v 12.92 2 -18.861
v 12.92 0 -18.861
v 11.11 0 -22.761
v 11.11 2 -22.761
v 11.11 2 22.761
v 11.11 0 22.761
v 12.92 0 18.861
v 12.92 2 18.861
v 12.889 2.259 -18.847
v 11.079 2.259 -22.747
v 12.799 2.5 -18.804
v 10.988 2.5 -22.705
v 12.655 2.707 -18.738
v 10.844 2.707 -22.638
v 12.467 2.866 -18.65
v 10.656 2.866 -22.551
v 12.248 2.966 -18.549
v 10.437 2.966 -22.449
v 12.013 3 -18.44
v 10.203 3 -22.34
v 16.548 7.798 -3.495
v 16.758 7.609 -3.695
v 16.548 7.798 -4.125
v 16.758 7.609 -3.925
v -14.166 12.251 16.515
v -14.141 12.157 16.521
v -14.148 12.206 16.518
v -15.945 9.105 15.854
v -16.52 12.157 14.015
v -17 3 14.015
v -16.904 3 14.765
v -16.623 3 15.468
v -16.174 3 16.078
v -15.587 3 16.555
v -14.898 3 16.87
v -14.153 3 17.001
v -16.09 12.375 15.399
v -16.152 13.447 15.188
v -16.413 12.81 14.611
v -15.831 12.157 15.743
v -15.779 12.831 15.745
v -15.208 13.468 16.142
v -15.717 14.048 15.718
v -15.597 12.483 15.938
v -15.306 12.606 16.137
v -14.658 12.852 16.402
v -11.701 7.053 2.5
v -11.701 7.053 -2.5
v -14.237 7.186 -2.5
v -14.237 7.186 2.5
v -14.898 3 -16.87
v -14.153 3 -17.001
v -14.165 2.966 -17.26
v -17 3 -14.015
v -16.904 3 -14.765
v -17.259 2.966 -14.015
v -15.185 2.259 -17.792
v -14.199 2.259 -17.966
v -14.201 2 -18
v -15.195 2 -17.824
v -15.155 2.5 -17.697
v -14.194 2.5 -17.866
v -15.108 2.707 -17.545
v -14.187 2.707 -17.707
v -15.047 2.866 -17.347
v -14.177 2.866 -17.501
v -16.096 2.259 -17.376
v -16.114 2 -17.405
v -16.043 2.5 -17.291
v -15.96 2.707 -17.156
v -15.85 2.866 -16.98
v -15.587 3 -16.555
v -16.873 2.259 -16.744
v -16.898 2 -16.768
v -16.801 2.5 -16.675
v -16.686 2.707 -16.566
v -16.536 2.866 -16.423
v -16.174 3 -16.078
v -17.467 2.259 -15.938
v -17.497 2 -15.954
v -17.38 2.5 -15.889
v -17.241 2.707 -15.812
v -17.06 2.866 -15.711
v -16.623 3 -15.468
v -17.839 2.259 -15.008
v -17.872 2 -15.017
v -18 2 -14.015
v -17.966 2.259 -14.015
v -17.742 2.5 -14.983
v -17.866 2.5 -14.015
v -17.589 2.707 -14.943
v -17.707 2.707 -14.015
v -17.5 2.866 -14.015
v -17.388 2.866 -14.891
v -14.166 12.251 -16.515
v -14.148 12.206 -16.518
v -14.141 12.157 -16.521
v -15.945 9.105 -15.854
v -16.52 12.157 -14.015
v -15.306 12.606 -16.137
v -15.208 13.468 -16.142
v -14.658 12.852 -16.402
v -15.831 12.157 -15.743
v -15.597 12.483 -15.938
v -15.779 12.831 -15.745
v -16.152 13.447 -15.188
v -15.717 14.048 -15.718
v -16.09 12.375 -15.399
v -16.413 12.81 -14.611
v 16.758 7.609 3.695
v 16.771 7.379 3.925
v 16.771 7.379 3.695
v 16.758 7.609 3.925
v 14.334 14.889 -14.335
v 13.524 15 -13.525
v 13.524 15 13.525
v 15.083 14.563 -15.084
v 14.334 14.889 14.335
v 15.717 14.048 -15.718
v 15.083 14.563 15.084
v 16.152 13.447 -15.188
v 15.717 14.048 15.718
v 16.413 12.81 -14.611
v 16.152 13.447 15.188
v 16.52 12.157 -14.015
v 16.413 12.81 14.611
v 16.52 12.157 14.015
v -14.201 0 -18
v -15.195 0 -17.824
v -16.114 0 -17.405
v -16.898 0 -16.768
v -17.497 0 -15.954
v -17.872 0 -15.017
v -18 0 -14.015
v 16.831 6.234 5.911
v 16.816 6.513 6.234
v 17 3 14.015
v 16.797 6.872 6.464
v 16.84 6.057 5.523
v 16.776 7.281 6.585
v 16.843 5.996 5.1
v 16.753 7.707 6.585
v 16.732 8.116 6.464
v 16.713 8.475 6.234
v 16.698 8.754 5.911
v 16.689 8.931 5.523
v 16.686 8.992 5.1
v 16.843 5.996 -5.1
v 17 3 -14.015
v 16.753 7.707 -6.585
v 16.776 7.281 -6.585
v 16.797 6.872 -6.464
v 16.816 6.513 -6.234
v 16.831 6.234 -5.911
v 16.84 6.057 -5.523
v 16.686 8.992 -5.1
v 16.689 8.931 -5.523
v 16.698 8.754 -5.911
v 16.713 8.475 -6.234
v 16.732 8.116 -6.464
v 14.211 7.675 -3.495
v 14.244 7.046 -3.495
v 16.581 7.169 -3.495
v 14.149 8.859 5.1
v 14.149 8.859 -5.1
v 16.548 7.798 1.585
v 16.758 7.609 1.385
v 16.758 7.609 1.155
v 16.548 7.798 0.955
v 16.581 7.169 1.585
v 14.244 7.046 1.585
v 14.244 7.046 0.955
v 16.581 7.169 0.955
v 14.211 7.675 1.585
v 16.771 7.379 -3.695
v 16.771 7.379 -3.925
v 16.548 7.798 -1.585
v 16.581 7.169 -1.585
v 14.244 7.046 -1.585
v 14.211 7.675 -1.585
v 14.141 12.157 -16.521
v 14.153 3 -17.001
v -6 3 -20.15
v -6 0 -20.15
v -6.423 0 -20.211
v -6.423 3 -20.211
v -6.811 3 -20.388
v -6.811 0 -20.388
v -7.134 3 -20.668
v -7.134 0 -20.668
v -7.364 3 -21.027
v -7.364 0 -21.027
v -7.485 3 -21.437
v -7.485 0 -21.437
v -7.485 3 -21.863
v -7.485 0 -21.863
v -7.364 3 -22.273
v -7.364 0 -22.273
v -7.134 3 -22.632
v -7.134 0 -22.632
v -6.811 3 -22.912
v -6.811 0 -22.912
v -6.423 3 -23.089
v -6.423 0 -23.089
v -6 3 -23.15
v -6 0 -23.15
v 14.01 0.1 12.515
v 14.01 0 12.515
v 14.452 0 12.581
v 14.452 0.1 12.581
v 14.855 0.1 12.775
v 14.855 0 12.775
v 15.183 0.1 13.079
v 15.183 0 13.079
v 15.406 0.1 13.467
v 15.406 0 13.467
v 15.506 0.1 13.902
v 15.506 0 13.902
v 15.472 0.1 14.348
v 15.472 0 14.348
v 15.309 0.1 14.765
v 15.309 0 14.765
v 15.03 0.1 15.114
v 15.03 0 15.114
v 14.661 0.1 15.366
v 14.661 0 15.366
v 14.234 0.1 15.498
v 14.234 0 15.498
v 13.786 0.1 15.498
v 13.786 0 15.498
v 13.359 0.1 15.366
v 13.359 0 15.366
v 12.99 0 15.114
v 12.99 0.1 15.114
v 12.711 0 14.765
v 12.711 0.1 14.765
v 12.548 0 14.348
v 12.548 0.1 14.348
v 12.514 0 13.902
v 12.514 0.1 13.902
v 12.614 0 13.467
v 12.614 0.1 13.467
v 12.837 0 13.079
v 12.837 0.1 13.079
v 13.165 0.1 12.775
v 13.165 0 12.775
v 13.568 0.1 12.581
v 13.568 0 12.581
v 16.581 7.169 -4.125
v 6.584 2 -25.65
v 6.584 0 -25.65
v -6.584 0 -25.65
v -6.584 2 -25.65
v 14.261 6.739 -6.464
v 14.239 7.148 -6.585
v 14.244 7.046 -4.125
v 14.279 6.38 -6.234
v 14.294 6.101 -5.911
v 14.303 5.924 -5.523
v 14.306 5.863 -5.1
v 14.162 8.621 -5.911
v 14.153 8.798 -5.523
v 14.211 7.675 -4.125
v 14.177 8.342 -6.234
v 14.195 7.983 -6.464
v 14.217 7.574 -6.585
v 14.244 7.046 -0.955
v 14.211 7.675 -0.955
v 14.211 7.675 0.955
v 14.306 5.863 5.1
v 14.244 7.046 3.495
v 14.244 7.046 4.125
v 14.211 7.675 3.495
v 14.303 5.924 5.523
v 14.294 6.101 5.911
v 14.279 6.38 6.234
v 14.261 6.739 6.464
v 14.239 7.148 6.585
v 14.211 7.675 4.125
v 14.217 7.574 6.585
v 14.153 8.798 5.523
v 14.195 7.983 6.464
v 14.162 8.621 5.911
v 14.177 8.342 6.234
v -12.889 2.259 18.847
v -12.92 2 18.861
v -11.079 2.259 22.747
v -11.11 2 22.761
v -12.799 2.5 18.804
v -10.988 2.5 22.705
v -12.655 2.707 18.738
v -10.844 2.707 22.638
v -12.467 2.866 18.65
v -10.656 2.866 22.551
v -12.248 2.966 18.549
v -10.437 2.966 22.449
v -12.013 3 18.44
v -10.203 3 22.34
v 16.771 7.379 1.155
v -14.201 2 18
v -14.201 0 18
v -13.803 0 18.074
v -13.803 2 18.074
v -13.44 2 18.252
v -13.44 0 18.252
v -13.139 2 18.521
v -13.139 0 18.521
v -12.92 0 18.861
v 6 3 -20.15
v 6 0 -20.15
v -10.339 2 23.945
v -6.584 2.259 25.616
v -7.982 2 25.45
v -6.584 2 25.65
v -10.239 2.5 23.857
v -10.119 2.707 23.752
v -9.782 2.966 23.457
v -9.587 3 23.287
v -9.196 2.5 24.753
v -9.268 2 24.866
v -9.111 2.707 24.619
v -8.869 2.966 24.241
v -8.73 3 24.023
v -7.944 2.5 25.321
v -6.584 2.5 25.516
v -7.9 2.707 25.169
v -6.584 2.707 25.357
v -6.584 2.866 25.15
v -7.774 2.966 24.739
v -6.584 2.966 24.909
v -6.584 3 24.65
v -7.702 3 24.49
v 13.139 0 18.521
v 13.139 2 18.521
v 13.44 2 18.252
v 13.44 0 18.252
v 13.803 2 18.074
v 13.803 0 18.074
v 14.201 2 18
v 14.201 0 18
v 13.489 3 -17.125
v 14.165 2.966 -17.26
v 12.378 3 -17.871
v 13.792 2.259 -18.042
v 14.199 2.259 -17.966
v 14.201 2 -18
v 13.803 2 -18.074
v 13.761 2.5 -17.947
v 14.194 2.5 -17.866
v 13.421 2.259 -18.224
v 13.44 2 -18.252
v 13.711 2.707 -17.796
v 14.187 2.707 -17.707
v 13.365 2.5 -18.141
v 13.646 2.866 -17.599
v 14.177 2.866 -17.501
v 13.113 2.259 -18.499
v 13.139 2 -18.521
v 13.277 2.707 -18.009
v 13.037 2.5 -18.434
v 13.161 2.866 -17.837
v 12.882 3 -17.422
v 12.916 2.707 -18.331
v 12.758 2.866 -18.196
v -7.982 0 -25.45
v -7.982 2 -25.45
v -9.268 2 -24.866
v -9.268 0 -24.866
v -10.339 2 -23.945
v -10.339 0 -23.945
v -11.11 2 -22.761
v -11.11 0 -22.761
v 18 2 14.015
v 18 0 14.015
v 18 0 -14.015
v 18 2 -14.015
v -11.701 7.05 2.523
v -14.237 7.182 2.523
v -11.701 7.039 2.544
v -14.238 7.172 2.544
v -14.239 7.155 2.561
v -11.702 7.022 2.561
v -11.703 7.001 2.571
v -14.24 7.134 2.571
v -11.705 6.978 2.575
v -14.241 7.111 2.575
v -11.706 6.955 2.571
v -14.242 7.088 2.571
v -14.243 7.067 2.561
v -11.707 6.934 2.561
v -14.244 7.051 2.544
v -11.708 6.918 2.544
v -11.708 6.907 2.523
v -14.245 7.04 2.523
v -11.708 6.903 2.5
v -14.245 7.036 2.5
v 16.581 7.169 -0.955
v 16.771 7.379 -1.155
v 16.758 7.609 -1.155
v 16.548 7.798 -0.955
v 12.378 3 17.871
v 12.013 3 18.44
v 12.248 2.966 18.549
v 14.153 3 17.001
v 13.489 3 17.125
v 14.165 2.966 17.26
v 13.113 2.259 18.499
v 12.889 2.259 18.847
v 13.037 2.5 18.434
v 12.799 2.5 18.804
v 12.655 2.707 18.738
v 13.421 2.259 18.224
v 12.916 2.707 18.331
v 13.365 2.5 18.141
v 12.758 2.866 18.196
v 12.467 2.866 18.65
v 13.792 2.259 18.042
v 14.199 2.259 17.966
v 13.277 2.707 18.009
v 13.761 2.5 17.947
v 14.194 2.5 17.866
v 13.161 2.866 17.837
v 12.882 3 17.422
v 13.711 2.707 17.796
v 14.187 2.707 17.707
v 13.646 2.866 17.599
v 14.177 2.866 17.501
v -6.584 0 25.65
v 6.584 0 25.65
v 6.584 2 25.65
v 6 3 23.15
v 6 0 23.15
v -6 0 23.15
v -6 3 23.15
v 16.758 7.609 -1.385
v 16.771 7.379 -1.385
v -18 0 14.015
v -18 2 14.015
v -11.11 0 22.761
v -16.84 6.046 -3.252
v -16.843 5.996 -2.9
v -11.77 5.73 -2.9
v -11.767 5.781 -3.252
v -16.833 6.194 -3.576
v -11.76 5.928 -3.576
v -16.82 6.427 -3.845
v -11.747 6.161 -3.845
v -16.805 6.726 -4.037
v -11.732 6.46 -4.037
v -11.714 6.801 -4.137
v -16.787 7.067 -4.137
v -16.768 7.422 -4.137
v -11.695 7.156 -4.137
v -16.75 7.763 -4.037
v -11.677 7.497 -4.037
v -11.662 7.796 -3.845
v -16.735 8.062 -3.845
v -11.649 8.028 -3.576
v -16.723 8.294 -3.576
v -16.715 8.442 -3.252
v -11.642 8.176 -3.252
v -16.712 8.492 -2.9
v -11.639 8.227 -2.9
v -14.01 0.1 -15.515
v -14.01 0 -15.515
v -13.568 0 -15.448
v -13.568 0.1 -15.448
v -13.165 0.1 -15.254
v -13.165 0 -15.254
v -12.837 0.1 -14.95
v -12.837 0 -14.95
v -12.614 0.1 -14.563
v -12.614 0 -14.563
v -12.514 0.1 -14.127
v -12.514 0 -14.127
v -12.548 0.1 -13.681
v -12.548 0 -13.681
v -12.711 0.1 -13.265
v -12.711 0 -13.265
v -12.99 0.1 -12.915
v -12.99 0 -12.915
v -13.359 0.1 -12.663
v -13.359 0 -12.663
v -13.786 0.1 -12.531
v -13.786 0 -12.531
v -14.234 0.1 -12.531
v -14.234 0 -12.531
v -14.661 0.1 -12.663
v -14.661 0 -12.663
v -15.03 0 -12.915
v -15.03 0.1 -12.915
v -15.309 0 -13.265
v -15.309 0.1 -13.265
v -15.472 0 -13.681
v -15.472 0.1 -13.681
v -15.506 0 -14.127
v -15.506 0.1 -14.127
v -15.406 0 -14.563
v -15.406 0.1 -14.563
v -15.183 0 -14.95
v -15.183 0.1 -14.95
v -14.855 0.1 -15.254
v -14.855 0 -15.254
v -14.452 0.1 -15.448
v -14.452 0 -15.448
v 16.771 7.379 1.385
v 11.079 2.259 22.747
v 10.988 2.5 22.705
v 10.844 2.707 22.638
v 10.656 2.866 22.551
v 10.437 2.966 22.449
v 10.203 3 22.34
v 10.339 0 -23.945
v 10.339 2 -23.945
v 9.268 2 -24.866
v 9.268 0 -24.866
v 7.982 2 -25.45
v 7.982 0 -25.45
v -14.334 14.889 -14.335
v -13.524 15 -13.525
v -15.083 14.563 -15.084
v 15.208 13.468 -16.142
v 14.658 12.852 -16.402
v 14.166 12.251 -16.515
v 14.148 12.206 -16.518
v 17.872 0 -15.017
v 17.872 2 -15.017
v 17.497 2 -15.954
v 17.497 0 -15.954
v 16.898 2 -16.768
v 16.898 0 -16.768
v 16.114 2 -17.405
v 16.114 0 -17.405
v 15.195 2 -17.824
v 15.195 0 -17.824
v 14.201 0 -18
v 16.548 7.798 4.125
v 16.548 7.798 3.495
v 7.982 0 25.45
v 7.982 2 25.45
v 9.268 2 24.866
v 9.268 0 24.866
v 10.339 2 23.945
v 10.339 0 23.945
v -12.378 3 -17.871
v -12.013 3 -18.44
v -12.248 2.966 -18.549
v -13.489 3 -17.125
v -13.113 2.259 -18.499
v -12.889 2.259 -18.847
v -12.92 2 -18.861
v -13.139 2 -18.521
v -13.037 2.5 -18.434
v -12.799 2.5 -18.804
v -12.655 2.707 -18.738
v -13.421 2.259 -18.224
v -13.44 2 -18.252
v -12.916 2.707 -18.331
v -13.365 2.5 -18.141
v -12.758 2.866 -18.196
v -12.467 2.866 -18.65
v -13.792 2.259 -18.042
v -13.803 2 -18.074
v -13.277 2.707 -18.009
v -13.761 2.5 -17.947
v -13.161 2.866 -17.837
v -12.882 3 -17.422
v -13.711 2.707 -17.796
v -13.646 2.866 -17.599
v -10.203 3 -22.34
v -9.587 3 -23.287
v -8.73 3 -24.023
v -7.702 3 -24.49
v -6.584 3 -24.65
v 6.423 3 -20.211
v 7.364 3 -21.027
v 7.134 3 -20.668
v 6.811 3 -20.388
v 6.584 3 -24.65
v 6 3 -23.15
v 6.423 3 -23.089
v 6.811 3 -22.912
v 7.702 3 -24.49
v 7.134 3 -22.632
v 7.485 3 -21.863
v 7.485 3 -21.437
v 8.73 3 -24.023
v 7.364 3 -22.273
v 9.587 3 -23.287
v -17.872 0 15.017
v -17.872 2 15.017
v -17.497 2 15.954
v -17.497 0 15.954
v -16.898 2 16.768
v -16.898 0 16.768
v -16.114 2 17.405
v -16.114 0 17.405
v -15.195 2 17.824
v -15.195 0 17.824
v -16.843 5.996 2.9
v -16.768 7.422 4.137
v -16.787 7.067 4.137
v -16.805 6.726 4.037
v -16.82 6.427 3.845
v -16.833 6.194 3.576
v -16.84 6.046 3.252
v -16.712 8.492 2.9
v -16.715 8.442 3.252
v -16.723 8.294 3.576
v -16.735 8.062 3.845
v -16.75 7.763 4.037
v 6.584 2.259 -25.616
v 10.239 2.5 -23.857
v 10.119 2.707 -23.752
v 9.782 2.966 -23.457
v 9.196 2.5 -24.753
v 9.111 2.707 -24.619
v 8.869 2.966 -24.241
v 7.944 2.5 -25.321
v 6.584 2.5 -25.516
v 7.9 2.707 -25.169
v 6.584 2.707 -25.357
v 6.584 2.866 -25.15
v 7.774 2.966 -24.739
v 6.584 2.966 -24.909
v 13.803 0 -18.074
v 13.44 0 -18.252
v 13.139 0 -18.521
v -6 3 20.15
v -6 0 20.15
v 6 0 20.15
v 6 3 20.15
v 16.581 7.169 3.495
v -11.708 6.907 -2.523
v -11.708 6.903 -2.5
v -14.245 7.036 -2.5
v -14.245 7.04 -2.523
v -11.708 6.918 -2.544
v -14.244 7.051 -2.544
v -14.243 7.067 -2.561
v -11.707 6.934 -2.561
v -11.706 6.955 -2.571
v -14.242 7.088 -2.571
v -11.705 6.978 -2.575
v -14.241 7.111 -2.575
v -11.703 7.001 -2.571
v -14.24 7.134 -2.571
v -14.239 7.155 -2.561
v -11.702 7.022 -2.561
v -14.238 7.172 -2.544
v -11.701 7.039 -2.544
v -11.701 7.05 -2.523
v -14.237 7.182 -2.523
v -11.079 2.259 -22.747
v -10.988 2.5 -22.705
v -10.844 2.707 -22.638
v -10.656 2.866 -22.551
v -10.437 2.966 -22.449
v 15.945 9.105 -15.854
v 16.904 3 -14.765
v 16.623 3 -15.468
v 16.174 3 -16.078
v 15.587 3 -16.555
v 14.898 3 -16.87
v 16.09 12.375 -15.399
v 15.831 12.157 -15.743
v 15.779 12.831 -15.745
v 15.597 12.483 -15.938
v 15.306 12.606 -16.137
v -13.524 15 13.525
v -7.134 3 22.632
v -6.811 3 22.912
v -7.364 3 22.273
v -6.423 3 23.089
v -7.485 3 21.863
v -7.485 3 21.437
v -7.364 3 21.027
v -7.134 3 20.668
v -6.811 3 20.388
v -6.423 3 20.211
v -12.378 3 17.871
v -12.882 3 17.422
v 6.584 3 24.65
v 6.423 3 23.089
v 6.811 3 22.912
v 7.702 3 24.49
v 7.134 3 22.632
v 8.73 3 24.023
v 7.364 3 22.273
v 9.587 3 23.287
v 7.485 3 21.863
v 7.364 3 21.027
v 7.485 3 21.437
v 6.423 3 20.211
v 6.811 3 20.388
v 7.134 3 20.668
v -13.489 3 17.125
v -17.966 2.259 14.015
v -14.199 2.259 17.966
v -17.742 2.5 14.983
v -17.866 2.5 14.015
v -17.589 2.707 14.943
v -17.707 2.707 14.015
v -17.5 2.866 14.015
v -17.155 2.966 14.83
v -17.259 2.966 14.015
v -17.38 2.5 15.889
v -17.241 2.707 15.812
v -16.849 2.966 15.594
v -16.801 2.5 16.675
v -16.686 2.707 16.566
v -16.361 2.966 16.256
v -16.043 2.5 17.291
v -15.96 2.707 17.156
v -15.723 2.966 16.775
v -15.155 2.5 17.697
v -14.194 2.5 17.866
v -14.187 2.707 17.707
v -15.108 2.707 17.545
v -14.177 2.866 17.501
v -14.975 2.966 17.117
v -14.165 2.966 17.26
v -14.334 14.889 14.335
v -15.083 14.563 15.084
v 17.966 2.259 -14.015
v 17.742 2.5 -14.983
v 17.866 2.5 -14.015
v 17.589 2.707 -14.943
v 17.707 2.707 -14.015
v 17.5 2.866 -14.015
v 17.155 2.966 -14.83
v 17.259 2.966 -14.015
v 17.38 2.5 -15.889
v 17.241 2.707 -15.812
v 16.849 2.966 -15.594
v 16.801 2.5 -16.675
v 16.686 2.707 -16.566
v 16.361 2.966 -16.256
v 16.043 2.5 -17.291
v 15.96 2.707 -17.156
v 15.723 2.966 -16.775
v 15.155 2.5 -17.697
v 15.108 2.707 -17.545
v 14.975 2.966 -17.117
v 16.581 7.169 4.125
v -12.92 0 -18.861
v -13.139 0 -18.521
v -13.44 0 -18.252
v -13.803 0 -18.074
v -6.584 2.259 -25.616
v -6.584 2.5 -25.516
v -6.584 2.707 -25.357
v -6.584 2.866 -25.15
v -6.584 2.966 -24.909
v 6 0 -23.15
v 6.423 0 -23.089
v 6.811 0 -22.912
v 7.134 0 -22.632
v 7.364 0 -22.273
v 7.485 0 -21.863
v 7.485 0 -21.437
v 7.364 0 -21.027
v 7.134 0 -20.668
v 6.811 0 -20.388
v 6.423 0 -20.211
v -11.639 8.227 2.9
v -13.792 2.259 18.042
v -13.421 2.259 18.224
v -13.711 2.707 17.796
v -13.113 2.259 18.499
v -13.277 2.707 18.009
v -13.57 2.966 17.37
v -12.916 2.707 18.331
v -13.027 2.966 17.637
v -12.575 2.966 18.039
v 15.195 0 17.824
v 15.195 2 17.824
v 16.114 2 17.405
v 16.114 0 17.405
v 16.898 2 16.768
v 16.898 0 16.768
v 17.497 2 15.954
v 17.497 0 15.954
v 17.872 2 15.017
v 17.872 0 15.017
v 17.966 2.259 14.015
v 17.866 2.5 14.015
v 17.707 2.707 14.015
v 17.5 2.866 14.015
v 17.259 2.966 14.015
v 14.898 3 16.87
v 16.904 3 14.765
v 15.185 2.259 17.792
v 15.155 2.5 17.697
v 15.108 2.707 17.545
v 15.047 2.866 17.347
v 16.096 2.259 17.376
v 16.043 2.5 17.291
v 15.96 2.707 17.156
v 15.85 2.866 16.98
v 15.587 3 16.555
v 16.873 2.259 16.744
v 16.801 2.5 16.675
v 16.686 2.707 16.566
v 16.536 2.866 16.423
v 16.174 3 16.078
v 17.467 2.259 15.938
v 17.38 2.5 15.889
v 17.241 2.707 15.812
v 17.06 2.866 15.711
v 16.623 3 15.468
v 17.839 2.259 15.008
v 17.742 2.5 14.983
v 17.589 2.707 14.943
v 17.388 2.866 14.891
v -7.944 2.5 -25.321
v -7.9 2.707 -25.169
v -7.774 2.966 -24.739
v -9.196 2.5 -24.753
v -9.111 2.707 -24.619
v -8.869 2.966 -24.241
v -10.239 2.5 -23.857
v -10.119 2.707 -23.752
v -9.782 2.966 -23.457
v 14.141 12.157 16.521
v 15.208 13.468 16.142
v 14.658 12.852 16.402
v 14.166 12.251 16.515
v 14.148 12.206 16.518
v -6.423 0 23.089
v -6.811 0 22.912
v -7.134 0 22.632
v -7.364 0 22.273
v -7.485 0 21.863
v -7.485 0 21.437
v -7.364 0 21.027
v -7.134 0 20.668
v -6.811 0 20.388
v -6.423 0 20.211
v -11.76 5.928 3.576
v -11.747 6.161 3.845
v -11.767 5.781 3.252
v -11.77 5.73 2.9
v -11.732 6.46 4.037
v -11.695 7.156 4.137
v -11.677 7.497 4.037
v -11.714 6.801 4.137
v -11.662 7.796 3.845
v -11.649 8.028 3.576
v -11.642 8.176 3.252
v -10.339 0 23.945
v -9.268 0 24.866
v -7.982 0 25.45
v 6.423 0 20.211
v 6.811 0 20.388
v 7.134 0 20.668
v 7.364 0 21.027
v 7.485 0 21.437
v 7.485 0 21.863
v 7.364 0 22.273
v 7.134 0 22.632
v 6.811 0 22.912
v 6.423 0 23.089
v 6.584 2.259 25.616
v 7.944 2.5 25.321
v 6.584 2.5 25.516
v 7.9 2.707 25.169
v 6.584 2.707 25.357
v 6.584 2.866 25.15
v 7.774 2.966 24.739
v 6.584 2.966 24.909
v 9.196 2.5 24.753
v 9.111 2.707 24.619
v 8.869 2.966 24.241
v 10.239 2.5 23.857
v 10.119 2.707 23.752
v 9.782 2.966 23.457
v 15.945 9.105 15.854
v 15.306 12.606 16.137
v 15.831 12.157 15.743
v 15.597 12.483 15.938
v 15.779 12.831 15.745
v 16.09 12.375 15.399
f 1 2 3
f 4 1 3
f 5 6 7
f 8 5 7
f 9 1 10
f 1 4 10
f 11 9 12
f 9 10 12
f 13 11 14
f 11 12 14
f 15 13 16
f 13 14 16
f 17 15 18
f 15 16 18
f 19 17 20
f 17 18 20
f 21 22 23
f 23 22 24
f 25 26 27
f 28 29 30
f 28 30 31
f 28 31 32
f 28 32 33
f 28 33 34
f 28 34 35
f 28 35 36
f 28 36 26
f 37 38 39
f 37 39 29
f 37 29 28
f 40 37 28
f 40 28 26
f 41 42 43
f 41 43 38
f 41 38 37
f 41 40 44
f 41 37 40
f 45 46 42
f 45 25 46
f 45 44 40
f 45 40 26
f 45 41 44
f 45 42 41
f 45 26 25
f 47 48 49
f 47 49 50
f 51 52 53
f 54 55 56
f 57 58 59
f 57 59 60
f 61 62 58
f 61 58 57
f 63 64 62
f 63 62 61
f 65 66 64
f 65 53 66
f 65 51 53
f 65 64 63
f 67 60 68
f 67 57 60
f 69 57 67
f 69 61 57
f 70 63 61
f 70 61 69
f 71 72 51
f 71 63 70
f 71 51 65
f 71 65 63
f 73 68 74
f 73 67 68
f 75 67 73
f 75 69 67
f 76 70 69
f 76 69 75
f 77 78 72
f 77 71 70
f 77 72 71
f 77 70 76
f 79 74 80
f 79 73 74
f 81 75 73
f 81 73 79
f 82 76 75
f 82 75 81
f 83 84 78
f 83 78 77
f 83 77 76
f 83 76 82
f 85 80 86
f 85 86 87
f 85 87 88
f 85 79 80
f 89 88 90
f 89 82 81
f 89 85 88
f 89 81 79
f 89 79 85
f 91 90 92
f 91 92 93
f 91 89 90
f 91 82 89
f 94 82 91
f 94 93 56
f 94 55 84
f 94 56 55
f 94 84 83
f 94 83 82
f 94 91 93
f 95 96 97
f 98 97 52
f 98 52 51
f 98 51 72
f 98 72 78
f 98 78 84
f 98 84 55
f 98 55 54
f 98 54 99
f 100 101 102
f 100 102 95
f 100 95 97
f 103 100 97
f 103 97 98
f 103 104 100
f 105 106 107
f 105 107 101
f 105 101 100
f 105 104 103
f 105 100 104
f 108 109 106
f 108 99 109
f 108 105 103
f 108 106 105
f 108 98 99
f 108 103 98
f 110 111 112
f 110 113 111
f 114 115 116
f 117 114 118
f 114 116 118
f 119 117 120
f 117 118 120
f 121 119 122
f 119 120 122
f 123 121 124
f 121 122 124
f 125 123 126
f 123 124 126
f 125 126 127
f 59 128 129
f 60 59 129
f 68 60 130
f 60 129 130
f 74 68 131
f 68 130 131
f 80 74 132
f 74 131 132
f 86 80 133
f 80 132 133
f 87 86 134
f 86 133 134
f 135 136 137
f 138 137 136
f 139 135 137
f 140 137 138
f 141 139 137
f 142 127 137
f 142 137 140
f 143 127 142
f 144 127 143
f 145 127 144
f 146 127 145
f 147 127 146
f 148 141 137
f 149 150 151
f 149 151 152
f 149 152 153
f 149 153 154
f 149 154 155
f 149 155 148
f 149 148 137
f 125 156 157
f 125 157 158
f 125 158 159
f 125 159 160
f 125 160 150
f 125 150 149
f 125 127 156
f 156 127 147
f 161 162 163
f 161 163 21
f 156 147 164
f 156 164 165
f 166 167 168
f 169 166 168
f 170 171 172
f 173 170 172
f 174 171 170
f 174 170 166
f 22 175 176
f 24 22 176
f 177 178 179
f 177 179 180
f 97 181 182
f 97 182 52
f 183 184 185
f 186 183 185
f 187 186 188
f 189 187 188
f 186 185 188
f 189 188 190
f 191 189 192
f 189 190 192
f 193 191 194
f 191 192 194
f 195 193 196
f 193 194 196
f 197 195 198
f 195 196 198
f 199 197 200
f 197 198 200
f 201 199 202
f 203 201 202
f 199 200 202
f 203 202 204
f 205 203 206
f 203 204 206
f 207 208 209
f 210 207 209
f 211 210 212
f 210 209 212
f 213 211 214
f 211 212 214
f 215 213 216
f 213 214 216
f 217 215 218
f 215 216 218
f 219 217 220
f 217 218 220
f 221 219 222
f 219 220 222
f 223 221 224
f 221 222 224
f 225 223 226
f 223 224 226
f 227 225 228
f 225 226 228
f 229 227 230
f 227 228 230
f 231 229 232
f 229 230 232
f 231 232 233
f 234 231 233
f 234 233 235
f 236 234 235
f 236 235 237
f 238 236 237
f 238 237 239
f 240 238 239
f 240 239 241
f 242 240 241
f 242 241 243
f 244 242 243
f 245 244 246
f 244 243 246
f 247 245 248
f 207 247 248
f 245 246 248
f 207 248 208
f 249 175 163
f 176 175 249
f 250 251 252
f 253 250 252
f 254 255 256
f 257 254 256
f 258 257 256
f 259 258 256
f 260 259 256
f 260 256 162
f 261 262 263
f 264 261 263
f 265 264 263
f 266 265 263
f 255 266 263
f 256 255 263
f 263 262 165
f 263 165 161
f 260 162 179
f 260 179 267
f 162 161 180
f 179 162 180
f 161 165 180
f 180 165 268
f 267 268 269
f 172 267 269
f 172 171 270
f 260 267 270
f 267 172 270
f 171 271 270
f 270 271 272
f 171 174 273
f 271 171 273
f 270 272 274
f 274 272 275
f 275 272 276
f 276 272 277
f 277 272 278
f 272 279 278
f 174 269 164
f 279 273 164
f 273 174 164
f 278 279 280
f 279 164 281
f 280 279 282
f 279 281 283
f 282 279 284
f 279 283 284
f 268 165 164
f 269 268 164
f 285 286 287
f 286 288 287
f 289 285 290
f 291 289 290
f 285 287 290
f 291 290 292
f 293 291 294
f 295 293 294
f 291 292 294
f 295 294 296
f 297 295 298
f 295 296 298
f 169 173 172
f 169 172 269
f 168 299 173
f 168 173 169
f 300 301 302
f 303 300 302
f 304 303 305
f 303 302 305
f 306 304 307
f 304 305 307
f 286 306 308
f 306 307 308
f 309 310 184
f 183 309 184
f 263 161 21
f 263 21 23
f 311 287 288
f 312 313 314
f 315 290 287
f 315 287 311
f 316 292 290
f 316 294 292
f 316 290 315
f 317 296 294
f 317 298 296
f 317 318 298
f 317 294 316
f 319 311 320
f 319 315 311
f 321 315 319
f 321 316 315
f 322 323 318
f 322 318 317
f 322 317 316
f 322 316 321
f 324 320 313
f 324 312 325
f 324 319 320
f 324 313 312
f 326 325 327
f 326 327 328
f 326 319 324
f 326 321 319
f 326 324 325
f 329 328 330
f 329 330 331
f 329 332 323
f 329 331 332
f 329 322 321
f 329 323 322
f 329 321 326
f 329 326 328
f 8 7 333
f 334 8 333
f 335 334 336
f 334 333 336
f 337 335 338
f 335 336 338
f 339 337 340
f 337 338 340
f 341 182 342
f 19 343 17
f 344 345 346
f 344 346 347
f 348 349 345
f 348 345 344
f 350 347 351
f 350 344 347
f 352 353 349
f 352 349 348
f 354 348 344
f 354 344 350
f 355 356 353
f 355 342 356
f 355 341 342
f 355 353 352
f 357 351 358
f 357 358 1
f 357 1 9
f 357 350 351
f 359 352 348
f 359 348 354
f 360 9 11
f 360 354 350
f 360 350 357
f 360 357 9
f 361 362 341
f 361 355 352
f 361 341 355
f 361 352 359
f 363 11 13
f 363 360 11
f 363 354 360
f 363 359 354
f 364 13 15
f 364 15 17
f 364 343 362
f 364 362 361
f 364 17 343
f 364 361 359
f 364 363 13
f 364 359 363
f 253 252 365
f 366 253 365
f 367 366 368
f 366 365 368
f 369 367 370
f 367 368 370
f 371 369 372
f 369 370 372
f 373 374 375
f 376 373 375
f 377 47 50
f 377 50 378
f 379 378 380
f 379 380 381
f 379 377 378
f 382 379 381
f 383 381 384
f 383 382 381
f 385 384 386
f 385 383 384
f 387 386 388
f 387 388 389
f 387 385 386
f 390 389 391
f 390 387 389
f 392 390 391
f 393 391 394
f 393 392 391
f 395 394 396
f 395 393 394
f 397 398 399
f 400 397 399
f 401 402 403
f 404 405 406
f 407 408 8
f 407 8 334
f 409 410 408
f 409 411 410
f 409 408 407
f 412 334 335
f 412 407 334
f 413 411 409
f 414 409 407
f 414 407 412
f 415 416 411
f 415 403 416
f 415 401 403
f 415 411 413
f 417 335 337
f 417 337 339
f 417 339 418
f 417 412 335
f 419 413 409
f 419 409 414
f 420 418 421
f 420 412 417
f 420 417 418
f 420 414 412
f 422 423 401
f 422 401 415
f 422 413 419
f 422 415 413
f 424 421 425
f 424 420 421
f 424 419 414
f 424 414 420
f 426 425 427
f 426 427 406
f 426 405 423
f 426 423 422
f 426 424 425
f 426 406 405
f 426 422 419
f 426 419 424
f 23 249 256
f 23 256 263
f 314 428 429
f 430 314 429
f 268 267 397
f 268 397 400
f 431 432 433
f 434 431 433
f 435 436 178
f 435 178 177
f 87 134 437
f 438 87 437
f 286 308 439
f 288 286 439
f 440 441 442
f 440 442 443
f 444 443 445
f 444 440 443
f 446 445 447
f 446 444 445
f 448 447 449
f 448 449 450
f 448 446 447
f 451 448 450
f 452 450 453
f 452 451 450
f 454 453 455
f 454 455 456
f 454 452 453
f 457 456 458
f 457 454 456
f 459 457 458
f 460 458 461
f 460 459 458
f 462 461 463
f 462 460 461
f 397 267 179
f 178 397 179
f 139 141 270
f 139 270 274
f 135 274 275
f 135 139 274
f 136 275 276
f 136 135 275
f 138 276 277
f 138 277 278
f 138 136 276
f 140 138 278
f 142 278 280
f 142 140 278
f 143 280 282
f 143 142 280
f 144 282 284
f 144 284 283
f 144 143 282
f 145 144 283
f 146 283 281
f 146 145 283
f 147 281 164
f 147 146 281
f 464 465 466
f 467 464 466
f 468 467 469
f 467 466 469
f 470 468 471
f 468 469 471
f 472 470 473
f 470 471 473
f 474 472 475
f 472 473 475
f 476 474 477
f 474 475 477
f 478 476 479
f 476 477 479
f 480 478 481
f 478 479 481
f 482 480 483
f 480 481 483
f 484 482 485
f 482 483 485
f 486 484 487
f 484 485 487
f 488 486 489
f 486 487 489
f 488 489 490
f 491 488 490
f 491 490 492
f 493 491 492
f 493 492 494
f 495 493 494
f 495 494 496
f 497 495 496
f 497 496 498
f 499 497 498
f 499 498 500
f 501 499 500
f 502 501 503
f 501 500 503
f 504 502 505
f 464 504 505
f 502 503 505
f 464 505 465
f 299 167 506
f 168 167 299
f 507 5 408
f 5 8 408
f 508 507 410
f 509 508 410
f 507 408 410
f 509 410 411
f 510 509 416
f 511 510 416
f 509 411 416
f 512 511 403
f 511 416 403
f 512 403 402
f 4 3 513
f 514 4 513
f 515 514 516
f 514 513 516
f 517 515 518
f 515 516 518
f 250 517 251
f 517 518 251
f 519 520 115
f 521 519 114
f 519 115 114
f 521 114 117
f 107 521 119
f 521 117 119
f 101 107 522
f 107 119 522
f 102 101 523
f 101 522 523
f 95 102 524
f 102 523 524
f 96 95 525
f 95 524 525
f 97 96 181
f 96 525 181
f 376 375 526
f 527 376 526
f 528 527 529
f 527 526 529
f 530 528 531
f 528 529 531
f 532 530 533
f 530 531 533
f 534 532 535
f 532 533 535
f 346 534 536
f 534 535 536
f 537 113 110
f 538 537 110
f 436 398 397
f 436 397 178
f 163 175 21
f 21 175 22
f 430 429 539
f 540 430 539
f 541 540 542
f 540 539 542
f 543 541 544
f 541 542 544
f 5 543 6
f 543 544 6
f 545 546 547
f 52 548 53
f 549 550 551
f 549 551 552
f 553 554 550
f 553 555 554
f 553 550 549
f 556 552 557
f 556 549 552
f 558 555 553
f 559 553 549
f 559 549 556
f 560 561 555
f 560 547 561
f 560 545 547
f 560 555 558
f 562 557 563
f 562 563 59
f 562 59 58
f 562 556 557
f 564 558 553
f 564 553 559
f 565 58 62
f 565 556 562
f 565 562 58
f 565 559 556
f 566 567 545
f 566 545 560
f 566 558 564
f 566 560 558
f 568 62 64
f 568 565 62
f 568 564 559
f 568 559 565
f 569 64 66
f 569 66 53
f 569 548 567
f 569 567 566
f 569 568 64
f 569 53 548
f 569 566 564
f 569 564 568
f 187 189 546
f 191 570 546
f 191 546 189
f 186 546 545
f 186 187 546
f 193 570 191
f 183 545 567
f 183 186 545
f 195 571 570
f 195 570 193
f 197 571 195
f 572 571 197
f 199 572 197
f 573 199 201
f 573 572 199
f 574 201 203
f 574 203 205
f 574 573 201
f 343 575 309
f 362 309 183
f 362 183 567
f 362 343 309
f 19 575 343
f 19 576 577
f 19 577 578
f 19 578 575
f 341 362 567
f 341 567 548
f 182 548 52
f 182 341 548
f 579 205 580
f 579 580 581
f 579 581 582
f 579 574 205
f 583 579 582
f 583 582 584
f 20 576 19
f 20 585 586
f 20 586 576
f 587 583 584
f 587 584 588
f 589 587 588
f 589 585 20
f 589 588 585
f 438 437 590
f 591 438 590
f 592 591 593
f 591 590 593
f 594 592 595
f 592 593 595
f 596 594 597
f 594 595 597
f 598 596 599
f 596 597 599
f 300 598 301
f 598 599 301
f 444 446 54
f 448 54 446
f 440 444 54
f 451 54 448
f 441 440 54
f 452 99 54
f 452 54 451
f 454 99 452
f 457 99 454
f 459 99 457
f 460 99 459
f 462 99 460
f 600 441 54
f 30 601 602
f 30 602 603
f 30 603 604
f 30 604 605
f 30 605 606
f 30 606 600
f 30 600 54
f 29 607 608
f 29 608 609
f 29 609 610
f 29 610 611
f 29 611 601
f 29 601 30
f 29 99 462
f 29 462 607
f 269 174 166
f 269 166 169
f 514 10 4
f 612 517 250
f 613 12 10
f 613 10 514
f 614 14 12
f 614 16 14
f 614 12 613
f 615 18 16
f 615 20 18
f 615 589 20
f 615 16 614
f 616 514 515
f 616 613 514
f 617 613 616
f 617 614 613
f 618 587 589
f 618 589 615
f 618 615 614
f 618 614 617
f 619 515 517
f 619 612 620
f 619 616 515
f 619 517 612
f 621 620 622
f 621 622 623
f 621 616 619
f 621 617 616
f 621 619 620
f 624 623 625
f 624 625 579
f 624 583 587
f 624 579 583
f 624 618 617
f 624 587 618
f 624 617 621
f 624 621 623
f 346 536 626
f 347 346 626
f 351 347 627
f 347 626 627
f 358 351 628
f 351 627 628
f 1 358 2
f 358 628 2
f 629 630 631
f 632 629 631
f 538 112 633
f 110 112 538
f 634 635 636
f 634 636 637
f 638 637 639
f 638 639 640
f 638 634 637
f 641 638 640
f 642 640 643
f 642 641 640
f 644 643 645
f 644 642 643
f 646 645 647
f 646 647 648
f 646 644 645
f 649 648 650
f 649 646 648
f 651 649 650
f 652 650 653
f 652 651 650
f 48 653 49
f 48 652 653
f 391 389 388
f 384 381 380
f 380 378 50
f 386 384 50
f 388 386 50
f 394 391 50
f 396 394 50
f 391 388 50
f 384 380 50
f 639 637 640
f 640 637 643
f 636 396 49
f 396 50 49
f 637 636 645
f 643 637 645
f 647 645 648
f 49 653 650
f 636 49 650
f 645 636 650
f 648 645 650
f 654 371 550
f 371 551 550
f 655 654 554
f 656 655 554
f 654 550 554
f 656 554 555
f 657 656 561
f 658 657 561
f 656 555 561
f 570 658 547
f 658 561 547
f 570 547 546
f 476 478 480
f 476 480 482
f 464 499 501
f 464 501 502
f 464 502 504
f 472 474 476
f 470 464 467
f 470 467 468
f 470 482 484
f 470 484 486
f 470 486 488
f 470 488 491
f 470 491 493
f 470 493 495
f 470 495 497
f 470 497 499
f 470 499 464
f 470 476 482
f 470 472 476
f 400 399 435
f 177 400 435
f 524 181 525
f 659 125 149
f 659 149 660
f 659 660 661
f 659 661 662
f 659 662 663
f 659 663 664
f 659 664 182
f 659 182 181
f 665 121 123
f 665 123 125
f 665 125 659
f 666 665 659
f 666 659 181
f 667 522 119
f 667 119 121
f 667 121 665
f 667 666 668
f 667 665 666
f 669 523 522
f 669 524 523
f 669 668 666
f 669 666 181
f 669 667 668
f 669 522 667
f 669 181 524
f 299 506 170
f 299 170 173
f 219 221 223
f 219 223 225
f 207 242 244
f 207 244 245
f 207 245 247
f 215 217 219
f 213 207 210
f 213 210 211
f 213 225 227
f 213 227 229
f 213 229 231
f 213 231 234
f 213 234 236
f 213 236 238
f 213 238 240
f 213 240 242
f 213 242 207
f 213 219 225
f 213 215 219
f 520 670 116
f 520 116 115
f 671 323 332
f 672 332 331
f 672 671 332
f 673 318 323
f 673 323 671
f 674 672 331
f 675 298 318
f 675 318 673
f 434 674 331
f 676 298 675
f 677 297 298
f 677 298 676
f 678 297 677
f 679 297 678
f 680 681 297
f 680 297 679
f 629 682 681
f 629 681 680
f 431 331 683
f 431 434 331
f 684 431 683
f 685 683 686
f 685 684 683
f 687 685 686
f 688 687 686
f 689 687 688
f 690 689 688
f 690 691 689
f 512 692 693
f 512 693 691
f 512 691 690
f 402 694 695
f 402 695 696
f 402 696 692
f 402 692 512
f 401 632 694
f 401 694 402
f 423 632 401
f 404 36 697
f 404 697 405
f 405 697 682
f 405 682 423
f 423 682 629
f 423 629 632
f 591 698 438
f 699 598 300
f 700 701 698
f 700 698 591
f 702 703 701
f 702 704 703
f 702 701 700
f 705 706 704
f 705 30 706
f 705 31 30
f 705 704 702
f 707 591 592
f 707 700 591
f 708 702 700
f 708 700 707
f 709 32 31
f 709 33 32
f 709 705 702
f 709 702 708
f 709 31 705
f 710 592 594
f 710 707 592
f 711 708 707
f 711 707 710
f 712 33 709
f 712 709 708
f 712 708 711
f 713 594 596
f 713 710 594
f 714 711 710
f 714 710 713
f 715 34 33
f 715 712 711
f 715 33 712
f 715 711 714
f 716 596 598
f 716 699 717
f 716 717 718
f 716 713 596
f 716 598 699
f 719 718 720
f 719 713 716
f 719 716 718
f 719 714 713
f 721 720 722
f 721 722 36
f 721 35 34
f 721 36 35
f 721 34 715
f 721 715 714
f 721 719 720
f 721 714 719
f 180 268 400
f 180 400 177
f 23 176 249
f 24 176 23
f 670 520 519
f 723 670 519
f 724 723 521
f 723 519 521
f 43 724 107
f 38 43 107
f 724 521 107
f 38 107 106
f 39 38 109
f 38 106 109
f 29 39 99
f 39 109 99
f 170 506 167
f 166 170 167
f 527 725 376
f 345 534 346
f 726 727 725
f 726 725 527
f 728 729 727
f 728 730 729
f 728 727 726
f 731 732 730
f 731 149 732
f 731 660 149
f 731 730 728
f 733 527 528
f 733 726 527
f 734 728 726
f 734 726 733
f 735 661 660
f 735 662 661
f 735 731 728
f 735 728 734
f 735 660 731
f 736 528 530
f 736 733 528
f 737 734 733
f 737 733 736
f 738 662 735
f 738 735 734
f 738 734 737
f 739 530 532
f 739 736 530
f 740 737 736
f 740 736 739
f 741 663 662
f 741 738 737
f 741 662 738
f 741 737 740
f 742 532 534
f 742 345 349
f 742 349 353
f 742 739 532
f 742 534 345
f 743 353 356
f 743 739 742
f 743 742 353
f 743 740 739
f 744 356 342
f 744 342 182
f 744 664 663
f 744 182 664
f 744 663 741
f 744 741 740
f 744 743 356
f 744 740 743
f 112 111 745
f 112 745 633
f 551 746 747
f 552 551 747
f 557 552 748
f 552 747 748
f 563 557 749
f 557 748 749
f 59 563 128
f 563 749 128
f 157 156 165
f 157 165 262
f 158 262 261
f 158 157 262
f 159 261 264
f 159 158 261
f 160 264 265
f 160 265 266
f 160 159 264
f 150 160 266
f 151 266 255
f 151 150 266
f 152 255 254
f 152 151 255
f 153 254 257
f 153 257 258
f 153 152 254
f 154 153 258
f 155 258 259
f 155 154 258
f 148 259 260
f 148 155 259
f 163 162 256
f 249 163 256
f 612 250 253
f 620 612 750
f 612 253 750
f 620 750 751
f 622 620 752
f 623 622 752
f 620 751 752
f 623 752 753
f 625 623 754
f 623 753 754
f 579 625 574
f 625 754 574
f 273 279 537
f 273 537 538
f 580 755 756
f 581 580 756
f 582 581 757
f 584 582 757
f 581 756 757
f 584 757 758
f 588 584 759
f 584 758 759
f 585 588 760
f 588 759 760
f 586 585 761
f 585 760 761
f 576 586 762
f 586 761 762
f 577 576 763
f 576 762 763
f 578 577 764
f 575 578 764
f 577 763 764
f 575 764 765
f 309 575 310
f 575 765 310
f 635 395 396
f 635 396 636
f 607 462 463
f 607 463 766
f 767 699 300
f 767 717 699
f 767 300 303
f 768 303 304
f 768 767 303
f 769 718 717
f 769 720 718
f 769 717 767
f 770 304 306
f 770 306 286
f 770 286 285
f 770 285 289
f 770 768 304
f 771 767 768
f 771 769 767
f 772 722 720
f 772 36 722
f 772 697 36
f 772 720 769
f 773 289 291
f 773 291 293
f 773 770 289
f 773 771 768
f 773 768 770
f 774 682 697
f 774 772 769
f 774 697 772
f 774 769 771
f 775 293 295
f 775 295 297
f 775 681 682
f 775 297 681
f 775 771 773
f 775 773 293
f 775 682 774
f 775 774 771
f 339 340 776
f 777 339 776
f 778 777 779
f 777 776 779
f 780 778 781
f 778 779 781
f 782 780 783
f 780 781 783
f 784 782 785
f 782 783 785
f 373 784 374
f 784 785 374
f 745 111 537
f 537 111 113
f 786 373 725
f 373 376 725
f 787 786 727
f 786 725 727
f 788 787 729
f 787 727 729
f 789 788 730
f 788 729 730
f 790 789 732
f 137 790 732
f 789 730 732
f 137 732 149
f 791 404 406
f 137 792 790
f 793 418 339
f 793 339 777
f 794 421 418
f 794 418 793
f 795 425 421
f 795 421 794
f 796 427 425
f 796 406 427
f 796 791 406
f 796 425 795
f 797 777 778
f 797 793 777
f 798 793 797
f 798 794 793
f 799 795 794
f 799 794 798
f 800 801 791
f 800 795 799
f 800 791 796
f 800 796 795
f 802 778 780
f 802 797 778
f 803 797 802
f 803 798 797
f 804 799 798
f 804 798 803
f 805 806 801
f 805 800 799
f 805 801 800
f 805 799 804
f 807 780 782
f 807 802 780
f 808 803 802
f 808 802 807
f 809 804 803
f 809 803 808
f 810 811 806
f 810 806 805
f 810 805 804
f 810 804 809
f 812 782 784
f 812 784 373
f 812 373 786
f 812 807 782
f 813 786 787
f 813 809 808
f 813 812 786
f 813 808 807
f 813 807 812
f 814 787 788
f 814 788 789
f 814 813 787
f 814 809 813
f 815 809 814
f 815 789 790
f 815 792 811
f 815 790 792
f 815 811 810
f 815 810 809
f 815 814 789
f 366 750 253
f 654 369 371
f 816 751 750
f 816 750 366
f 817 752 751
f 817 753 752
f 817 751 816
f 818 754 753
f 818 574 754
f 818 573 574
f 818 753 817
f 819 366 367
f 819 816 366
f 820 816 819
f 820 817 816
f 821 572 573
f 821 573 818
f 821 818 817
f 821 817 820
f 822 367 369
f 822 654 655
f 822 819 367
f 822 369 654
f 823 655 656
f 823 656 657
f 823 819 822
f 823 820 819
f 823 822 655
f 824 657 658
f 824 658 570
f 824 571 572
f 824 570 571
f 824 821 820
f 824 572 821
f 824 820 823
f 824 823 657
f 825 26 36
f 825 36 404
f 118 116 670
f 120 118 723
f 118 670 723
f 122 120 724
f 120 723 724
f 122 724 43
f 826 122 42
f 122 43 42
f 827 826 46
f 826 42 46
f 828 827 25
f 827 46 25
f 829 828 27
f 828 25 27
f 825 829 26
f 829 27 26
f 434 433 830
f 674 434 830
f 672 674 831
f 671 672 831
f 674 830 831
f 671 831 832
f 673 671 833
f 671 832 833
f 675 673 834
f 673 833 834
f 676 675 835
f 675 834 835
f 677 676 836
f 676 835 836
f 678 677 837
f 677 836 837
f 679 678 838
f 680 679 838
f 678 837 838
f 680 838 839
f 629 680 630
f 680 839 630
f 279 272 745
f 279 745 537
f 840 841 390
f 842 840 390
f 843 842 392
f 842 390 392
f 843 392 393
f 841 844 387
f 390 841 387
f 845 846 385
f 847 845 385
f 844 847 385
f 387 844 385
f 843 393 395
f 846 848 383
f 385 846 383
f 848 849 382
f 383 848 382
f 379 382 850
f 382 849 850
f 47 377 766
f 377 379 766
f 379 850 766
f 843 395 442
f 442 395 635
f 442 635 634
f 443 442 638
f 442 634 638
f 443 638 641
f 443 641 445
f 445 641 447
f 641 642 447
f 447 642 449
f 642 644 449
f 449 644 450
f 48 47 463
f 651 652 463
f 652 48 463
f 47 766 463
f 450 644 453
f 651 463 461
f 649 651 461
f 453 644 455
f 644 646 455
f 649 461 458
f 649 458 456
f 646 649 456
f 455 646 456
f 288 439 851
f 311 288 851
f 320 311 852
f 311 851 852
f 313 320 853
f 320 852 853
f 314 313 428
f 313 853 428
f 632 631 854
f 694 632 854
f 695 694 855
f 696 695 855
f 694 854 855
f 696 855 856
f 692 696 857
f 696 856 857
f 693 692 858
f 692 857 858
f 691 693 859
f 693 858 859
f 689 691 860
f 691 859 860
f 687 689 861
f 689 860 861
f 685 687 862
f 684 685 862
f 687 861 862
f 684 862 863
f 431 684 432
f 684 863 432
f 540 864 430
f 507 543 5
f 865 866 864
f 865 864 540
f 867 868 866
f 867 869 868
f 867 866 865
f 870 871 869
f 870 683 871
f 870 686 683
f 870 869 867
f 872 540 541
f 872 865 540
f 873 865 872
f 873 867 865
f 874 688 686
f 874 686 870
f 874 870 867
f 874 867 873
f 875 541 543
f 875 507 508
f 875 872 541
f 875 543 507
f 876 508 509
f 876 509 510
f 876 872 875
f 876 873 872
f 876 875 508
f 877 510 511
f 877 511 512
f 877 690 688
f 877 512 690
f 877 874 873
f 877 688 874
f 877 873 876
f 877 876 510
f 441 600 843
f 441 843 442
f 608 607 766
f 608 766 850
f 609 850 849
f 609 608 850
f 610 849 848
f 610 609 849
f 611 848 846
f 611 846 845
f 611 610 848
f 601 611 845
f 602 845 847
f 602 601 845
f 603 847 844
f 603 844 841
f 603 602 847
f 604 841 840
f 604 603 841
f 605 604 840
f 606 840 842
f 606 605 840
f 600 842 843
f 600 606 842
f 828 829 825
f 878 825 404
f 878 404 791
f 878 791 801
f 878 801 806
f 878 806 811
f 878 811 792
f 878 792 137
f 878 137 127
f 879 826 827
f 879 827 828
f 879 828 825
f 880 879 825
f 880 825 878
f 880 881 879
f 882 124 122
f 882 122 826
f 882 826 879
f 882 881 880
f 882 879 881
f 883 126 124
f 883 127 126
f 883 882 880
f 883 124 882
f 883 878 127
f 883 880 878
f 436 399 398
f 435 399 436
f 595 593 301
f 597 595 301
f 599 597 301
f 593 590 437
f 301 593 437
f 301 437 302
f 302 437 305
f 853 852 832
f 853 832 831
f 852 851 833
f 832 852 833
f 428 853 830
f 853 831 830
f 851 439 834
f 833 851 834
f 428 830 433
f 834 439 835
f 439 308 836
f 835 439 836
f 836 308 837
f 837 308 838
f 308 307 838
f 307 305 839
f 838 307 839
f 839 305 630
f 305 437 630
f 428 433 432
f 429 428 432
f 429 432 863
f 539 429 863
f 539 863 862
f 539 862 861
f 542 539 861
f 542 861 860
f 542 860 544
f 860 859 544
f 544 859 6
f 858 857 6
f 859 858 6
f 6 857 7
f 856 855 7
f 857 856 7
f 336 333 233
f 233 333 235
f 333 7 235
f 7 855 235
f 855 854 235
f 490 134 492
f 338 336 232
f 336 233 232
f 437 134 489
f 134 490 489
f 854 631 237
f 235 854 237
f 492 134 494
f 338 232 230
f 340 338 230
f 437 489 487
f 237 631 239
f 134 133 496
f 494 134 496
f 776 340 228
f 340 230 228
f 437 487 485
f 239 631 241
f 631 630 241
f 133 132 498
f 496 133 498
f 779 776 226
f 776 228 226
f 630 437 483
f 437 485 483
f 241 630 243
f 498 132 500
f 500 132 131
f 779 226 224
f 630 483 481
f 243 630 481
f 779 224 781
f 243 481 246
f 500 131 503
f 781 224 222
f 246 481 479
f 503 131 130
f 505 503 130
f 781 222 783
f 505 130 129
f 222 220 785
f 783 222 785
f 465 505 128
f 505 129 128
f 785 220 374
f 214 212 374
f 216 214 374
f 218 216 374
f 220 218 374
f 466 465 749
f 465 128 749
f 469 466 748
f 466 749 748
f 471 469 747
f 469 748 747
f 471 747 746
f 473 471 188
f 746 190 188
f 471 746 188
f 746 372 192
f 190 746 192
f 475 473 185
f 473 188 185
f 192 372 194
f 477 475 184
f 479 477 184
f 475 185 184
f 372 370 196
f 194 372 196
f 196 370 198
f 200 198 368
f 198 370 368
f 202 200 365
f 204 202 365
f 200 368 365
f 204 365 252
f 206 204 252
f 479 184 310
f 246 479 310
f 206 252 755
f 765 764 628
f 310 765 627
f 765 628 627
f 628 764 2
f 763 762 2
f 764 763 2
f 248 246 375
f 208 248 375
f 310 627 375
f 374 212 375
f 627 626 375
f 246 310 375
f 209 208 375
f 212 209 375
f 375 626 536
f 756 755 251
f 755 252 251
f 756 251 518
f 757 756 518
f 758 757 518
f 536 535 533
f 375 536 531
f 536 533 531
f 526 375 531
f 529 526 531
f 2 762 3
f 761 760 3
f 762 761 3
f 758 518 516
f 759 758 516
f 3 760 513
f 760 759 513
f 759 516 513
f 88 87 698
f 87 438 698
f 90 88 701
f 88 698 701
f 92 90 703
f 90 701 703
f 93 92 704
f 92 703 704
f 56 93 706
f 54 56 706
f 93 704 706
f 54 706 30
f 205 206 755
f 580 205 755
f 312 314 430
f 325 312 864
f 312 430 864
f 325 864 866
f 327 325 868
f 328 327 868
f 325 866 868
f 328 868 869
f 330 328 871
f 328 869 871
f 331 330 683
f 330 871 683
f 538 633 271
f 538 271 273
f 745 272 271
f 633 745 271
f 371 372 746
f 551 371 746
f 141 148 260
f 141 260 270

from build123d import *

# Parameters (mm, degrees)
EXTRUDE_1_DEPTH     = 3
FILLET_1_R          = 1
EXTRUDE_2_DEPTH     = 12
EXTRUDE_2_TAPER     = 3
FILLET_3_R          = 3
FILLET_4_R          = 3
CUT_EXTRUDE_1_DEPTH = 2.54
SKETCH_5_W          = 0.63
SKETCH_5_H          = 0.63
EXTRUDE_3_DEPTH     = 2.54
CHAMFER_2_SIZE      = 0.2
CHAMFER_3_SIZE      = 0.2
CUT_EXTRUDE_2_DEPTH = 5.08
EXTRUDE_4_DEPTH     = 2.54
SKETCH_8_R          = 1.5
CUT_EXTRUDE_3_DEPTH = 0.1


with BuildPart() as part:
    # 草图1 → 凸台-拉伸1 (new body)
    with BuildSketch(Plane(origin=(0, 0, 0), x_dir=(1, 0, 0), z_dir=(0, 1, 0))):
        with BuildLine():
            ThreePointArc((11.109578501, 22.761132302), (9.268225449, 24.866230509), (6.58350481, 25.65))
            Line((6.58350481, 25.65), (-6.58350481, 25.65))
            ThreePointArc((-6.58350481, 25.65), (-9.268225449, 24.866230509), (-11.109578501, 22.761132302))
            Line((-11.109578501, 22.761132302), (-12.92017347, 18.860908481))
            ThreePointArc((-12.92017347, 18.860908481), (-13.440232827, 18.25183334), (-14.200505299, 18))
            ThreePointArc((-14.200505299, 18), (-16.897924527, 16.767729012), (-18, 14.014550498))
            Line((-18, 14.014550498), (-18, 13.985449502))
            Line((-18, 13.985449502), (-18, -13.985449502))
            Line((-18, -13.985449502), (-18, -14.014550498))
            ThreePointArc((-18, -14.014550498), (-16.897924527, -16.767729012), (-14.200505299, -18))
            ThreePointArc((-14.200505299, -18), (-13.440232827, -18.25183334), (-12.92017347, -18.860908481))
            Line((-12.92017347, -18.860908481), (-11.109578501, -22.761132302))
            ThreePointArc((-11.109578501, -22.761132302), (-9.268225449, -24.866230509), (-6.58350481, -25.65))
            Line((-6.58350481, -25.65), (6.58350481, -25.65))
            ThreePointArc((6.58350481, -25.65), (9.268225449, -24.866230509), (11.109578501, -22.761132302))
            Line((11.109578501, -22.761132302), (12.92017347, -18.860908481))
            ThreePointArc((12.92017347, -18.860908481), (13.440232827, -18.25183334), (14.200505299, -18))
            ThreePointArc((14.200505299, -18), (16.897924527, -16.767729012), (18, -14.014550498))
            Line((18, -14.014550498), (18, 14.014550498))
            ThreePointArc((18, 14.014550498), (16.897924527, 16.767729012), (14.200505299, 18))
            ThreePointArc((14.200505299, 18), (13.440232827, 18.25183334), (12.92017347, 18.860908481))
            Line((12.92017347, 18.860908481), (11.109578501, 22.761132302))
        make_face()
        with BuildLine():
            Line((6, -23.15), (-6, -23.15))
            ThreePointArc((-6, -23.15), (-7.5, -21.65), (-6, -20.15))
            Line((-6, -20.15), (6, -20.15))
            ThreePointArc((6, -20.15), (7.5, -21.65), (6, -23.15))
        make_face(mode=Mode.SUBTRACT)
        with BuildLine():
            ThreePointArc((-6, 20.15), (-7.5, 21.65), (-6, 23.15))
            Line((-6, 23.15), (6, 23.15))
            ThreePointArc((6, 23.15), (7.5, 21.65), (6, 20.15))
            Line((6, 20.15), (-6, 20.15))
        make_face(mode=Mode.SUBTRACT)
    extrude(amount=EXTRUDE_1_DEPTH)

    # 圆角1
    fillet_1_edges = [part.edges().sort_by_distance(p)[0] for p in [
        (-12.014875986, 3, 20.811020391),
        (-9.268225449, 3, 24.866230509),
        (0, 3, 25.65),
        (9.268225449, 3, 24.866230509),
        (12.014875986, 3, 20.811020391),
        (13.440232827, 3, 18.25183334),
        (16.897924527, 3, 16.767729012),
        (18, 3, 0),
        (16.897924527, 3, -16.767729012),
        (13.440232827, 3, -18.25183334),
        (12.014875986, 3, -20.811020391),
        (9.268225449, 3, -24.866230509),
        (0, 3, -25.65),
        (-9.268225449, 3, -24.866230509),
        (-12.014875986, 3, -20.811020391),
        (-13.440232827, 3, -18.25183334),
        (-16.897924527, 3, -16.767729012),
        (-18, 3, 0),
        (-16.897924527, 3, 16.767729012),
        (-13.440232827, 3, 18.25183334),
    ]]
    fillet(fillet_1_edges, radius=FILLET_1_R)

    # 草图2 → 凸台-拉伸2 (add)
    with BuildSketch(Plane(origin=(0, 3, 0), x_dir=(1, 0, 0), z_dir=(0, 1, 0))):
        with BuildLine():
            ThreePointArc((-14.15275961, 17.001140476), (-16.174133919, 16.077709334), (-17, 14.014550498))
            Line((-17, 14.014550498), (-17, -14.014550498))
            ThreePointArc((-17, -14.014550498), (-16.174133919, -16.077709334), (-14.15275961, -17.001140476))
            Line((-14.15275961, -17.001140476), (14.15275961, -17.001140476))
            ThreePointArc((14.15275961, -17.001140476), (16.174133919, -16.077709334), (17, -14.014550498))
            Line((17, -14.014550498), (17, 14.014550498))
            ThreePointArc((17, 14.014550498), (16.174133919, 16.077709334), (14.15275961, 17.001140476))
            Line((14.15275961, 17.001140476), (-14.15275961, 17.001140476))
        make_face()
    extrude(amount=EXTRUDE_2_DEPTH, taper=EXTRUDE_2_TAPER)

    # 圆角3
    # the kernel refuses this fillet: 3 mm, written as the material it takes off along each edge
    with BuildSketch(Plane(origin=(-21.254085444, 15, 16.372247124), x_dir=(0, 0, -1), z_dir=(1, 0, 0))) as fillet_3_piece_1:
        with BuildLine():
            CenterArc((FILLET_3_R * 0.948964566715, -FILLET_3_R), FILLET_3_R, 90, 87)
            Line((-FILLET_3_R * 0.0496649680397, -FILLET_3_R * 0.947664043757), (0, 0))
            Line((0, 0), (FILLET_3_R * 0.948964566715, 0))
        make_face()
    extrude(amount=42.508170888, mode=Mode.SUBTRACT)
    with BuildSketch(Plane(origin=(21.254085444, 15, -16.372247124), x_dir=(0, -0.9986295347545739, -0.05233595624294369), z_dir=(-1, 0, 0))) as fillet_3_piece_2:
        with BuildLine():
            CenterArc((FILLET_3_R * 0.948964566715, FILLET_3_R), FILLET_3_R, 183, 87)
            Line((-FILLET_3_R * 0.0496649680397, FILLET_3_R * 0.947664043757), (0, 0))
            Line((0, 0), (FILLET_3_R * 0.948964566715, 0))
        make_face()
    extrude(amount=42.508170888, mode=Mode.SUBTRACT)

    # 圆角4
    # the kernel refuses this fillet: 3 mm, written as the material it takes off along each edge
    with BuildSketch(Plane(origin=(-16.371106649, 15, -20.642587675), x_dir=(-0.052335956242944966, -0.9986295347545738, 0), z_dir=(0, 0, 1)), Plane(origin=(16.371106649, 15, 20.642587675), x_dir=(0.05233595624294368, -0.9986295347545738, 0), z_dir=(0, 0, -1))) as fillet_4_piece_1:
        with BuildLine():
            CenterArc((FILLET_4_R * 0.948964566715, FILLET_4_R), FILLET_4_R, 183, 87)
            Line((-FILLET_4_R * 0.0496649680397, FILLET_4_R * 0.947664043757), (0, 0))
            Line((0, 0), (FILLET_4_R * 0.948964566715, 0))
        make_face()
    extrude(amount=41.285175349, mode=Mode.SUBTRACT)

    # 草图4 → 切除-拉伸1 (cut)
    with BuildSketch(Plane(origin=(17.110228806, 0.896709095, 0), x_dir=(0, 0, -1), z_dir=(0.998629534754574, 0.05233595624294391, 0))):
        with BuildLine():
            Line((-5.1, 8.106177348), (5.1, 8.106177348))
            ThreePointArc((5.1, 8.106177348), (6.6, 6.606177348), (5.1, 5.106177348))
            Line((5.1, 5.106177348), (-5.1, 5.106177348))
            ThreePointArc((-5.1, 5.106177348), (-6.6, 6.606177348), (-5.1, 8.106177348))
        make_face()
    extrude(amount=-CUT_EXTRUDE_1_DEPTH, mode=Mode.SUBTRACT)

    # 草图5 → 凸台-拉伸3 (add)
    with BuildSketch(Plane(origin=(14.573709787, 0.763775766, 0), x_dir=(0, 0, -1), z_dir=(0.998629534754574, 0.05233595624294393, 0))):
        with Locations((-1.27, 6.606177348)):
            Rectangle(SKETCH_5_W, SKETCH_5_H)
        with Locations((-3.81, 6.606177348)):
            Rectangle(SKETCH_5_W, SKETCH_5_H)
        with Locations((1.27, 6.606177348)):
            Rectangle(SKETCH_5_W, SKETCH_5_H)
        with Locations((3.81, 6.606177348)):
            Rectangle(SKETCH_5_W, SKETCH_5_H)
    extrude(amount=EXTRUDE_3_DEPTH)

    # 倒角2
    chamfer_2_edges = [part.edges().sort_by_distance(p)[0] for p in [
        (16.780974023, 7.179264603, 3.81),
        (16.764488197, 7.493832906, 4.125),
        (16.748002371, 7.80840121, 3.81),
        (16.764488197, 7.493832906, 3.495),
    ]]
    chamfer(chamfer_2_edges, length=CHAMFER_2_SIZE)

    # 倒角3
    chamfer_3_edges = [part.edges().sort_by_distance(p)[0] for p in [
        (16.764488197, 7.493832906, 1.585),
        (16.748002371, 7.80840121, 1.27),
        (16.764488197, 7.493832906, 0.955),
        (16.780974023, 7.179264603, 1.27),
        (16.764488197, 7.493832906, -0.955),
        (16.748002371, 7.80840121, -1.27),
        (16.764488197, 7.493832906, -1.585),
        (16.780974023, 7.179264603, -1.27),
        (16.764488197, 7.493832906, -3.495),
        (16.748002371, 7.80840121, -3.81),
        (16.764488197, 7.493832906, -4.125),
        (16.780974023, 7.179264603, -3.81),
    ]]
    chamfer(chamfer_3_edges, length=CHAMFER_3_SIZE)

    # 草图6 → 切除-拉伸2 (cut)
    with BuildSketch(Plane(origin=(-17.110228806, 0.896709095, 0), x_dir=(0, 0, 1), z_dir=(-0.998629534754574, 0.05233595624294391, -1.6069369669372317e-15))):
        with BuildLine():
            Line((-2.9, 7.606177348), (2.9, 7.606177348))
            ThreePointArc((2.9, 7.606177348), (4.15, 6.356177348), (2.9, 5.106177348))
            Line((2.9, 5.106177348), (-2.9, 5.106177348))
            ThreePointArc((-2.9, 5.106177348), (-4.15, 6.356177348), (-2.9, 7.606177348))
        make_face()
    extrude(amount=-CUT_EXTRUDE_2_DEPTH, mode=Mode.SUBTRACT)

    # 草图7 → 凸台-拉伸4 (add)
    with BuildSketch(Plane(origin=(-12.037190769, 0.630842437, 0), x_dir=(0, 0, 1), z_dir=(-0.998629534754574, 0.05233595624294393, -1.6069369669372323e-15))):
        with BuildLine():
            Line((-2.5, 6.431177348), (2.5, 6.431177348))
            ThreePointArc((2.5, 6.431177348), (2.575, 6.356177348), (2.5, 6.281177348))
            Line((2.5, 6.281177348), (-2.5, 6.281177348))
            ThreePointArc((-2.5, 6.281177348), (-2.575, 6.356177348), (-2.5, 6.431177348))
        make_face()
    extrude(amount=EXTRUDE_4_DEPTH)

    # 草图8 → 切除-拉伸3 (cut)
    with BuildSketch(Plane.XZ):
        with Locations(Location((14.01, 14.014550498, 0), (0, 0, 270))):
            Circle(SKETCH_8_R)
        with Locations(Location((-14.01, -14.014550498, 0), (0, 0, 270))):
            Circle(SKETCH_8_R)
    extrude(amount=-CUT_EXTRUDE_3_DEPTH, mode=Mode.SUBTRACT)


solid = part.part
